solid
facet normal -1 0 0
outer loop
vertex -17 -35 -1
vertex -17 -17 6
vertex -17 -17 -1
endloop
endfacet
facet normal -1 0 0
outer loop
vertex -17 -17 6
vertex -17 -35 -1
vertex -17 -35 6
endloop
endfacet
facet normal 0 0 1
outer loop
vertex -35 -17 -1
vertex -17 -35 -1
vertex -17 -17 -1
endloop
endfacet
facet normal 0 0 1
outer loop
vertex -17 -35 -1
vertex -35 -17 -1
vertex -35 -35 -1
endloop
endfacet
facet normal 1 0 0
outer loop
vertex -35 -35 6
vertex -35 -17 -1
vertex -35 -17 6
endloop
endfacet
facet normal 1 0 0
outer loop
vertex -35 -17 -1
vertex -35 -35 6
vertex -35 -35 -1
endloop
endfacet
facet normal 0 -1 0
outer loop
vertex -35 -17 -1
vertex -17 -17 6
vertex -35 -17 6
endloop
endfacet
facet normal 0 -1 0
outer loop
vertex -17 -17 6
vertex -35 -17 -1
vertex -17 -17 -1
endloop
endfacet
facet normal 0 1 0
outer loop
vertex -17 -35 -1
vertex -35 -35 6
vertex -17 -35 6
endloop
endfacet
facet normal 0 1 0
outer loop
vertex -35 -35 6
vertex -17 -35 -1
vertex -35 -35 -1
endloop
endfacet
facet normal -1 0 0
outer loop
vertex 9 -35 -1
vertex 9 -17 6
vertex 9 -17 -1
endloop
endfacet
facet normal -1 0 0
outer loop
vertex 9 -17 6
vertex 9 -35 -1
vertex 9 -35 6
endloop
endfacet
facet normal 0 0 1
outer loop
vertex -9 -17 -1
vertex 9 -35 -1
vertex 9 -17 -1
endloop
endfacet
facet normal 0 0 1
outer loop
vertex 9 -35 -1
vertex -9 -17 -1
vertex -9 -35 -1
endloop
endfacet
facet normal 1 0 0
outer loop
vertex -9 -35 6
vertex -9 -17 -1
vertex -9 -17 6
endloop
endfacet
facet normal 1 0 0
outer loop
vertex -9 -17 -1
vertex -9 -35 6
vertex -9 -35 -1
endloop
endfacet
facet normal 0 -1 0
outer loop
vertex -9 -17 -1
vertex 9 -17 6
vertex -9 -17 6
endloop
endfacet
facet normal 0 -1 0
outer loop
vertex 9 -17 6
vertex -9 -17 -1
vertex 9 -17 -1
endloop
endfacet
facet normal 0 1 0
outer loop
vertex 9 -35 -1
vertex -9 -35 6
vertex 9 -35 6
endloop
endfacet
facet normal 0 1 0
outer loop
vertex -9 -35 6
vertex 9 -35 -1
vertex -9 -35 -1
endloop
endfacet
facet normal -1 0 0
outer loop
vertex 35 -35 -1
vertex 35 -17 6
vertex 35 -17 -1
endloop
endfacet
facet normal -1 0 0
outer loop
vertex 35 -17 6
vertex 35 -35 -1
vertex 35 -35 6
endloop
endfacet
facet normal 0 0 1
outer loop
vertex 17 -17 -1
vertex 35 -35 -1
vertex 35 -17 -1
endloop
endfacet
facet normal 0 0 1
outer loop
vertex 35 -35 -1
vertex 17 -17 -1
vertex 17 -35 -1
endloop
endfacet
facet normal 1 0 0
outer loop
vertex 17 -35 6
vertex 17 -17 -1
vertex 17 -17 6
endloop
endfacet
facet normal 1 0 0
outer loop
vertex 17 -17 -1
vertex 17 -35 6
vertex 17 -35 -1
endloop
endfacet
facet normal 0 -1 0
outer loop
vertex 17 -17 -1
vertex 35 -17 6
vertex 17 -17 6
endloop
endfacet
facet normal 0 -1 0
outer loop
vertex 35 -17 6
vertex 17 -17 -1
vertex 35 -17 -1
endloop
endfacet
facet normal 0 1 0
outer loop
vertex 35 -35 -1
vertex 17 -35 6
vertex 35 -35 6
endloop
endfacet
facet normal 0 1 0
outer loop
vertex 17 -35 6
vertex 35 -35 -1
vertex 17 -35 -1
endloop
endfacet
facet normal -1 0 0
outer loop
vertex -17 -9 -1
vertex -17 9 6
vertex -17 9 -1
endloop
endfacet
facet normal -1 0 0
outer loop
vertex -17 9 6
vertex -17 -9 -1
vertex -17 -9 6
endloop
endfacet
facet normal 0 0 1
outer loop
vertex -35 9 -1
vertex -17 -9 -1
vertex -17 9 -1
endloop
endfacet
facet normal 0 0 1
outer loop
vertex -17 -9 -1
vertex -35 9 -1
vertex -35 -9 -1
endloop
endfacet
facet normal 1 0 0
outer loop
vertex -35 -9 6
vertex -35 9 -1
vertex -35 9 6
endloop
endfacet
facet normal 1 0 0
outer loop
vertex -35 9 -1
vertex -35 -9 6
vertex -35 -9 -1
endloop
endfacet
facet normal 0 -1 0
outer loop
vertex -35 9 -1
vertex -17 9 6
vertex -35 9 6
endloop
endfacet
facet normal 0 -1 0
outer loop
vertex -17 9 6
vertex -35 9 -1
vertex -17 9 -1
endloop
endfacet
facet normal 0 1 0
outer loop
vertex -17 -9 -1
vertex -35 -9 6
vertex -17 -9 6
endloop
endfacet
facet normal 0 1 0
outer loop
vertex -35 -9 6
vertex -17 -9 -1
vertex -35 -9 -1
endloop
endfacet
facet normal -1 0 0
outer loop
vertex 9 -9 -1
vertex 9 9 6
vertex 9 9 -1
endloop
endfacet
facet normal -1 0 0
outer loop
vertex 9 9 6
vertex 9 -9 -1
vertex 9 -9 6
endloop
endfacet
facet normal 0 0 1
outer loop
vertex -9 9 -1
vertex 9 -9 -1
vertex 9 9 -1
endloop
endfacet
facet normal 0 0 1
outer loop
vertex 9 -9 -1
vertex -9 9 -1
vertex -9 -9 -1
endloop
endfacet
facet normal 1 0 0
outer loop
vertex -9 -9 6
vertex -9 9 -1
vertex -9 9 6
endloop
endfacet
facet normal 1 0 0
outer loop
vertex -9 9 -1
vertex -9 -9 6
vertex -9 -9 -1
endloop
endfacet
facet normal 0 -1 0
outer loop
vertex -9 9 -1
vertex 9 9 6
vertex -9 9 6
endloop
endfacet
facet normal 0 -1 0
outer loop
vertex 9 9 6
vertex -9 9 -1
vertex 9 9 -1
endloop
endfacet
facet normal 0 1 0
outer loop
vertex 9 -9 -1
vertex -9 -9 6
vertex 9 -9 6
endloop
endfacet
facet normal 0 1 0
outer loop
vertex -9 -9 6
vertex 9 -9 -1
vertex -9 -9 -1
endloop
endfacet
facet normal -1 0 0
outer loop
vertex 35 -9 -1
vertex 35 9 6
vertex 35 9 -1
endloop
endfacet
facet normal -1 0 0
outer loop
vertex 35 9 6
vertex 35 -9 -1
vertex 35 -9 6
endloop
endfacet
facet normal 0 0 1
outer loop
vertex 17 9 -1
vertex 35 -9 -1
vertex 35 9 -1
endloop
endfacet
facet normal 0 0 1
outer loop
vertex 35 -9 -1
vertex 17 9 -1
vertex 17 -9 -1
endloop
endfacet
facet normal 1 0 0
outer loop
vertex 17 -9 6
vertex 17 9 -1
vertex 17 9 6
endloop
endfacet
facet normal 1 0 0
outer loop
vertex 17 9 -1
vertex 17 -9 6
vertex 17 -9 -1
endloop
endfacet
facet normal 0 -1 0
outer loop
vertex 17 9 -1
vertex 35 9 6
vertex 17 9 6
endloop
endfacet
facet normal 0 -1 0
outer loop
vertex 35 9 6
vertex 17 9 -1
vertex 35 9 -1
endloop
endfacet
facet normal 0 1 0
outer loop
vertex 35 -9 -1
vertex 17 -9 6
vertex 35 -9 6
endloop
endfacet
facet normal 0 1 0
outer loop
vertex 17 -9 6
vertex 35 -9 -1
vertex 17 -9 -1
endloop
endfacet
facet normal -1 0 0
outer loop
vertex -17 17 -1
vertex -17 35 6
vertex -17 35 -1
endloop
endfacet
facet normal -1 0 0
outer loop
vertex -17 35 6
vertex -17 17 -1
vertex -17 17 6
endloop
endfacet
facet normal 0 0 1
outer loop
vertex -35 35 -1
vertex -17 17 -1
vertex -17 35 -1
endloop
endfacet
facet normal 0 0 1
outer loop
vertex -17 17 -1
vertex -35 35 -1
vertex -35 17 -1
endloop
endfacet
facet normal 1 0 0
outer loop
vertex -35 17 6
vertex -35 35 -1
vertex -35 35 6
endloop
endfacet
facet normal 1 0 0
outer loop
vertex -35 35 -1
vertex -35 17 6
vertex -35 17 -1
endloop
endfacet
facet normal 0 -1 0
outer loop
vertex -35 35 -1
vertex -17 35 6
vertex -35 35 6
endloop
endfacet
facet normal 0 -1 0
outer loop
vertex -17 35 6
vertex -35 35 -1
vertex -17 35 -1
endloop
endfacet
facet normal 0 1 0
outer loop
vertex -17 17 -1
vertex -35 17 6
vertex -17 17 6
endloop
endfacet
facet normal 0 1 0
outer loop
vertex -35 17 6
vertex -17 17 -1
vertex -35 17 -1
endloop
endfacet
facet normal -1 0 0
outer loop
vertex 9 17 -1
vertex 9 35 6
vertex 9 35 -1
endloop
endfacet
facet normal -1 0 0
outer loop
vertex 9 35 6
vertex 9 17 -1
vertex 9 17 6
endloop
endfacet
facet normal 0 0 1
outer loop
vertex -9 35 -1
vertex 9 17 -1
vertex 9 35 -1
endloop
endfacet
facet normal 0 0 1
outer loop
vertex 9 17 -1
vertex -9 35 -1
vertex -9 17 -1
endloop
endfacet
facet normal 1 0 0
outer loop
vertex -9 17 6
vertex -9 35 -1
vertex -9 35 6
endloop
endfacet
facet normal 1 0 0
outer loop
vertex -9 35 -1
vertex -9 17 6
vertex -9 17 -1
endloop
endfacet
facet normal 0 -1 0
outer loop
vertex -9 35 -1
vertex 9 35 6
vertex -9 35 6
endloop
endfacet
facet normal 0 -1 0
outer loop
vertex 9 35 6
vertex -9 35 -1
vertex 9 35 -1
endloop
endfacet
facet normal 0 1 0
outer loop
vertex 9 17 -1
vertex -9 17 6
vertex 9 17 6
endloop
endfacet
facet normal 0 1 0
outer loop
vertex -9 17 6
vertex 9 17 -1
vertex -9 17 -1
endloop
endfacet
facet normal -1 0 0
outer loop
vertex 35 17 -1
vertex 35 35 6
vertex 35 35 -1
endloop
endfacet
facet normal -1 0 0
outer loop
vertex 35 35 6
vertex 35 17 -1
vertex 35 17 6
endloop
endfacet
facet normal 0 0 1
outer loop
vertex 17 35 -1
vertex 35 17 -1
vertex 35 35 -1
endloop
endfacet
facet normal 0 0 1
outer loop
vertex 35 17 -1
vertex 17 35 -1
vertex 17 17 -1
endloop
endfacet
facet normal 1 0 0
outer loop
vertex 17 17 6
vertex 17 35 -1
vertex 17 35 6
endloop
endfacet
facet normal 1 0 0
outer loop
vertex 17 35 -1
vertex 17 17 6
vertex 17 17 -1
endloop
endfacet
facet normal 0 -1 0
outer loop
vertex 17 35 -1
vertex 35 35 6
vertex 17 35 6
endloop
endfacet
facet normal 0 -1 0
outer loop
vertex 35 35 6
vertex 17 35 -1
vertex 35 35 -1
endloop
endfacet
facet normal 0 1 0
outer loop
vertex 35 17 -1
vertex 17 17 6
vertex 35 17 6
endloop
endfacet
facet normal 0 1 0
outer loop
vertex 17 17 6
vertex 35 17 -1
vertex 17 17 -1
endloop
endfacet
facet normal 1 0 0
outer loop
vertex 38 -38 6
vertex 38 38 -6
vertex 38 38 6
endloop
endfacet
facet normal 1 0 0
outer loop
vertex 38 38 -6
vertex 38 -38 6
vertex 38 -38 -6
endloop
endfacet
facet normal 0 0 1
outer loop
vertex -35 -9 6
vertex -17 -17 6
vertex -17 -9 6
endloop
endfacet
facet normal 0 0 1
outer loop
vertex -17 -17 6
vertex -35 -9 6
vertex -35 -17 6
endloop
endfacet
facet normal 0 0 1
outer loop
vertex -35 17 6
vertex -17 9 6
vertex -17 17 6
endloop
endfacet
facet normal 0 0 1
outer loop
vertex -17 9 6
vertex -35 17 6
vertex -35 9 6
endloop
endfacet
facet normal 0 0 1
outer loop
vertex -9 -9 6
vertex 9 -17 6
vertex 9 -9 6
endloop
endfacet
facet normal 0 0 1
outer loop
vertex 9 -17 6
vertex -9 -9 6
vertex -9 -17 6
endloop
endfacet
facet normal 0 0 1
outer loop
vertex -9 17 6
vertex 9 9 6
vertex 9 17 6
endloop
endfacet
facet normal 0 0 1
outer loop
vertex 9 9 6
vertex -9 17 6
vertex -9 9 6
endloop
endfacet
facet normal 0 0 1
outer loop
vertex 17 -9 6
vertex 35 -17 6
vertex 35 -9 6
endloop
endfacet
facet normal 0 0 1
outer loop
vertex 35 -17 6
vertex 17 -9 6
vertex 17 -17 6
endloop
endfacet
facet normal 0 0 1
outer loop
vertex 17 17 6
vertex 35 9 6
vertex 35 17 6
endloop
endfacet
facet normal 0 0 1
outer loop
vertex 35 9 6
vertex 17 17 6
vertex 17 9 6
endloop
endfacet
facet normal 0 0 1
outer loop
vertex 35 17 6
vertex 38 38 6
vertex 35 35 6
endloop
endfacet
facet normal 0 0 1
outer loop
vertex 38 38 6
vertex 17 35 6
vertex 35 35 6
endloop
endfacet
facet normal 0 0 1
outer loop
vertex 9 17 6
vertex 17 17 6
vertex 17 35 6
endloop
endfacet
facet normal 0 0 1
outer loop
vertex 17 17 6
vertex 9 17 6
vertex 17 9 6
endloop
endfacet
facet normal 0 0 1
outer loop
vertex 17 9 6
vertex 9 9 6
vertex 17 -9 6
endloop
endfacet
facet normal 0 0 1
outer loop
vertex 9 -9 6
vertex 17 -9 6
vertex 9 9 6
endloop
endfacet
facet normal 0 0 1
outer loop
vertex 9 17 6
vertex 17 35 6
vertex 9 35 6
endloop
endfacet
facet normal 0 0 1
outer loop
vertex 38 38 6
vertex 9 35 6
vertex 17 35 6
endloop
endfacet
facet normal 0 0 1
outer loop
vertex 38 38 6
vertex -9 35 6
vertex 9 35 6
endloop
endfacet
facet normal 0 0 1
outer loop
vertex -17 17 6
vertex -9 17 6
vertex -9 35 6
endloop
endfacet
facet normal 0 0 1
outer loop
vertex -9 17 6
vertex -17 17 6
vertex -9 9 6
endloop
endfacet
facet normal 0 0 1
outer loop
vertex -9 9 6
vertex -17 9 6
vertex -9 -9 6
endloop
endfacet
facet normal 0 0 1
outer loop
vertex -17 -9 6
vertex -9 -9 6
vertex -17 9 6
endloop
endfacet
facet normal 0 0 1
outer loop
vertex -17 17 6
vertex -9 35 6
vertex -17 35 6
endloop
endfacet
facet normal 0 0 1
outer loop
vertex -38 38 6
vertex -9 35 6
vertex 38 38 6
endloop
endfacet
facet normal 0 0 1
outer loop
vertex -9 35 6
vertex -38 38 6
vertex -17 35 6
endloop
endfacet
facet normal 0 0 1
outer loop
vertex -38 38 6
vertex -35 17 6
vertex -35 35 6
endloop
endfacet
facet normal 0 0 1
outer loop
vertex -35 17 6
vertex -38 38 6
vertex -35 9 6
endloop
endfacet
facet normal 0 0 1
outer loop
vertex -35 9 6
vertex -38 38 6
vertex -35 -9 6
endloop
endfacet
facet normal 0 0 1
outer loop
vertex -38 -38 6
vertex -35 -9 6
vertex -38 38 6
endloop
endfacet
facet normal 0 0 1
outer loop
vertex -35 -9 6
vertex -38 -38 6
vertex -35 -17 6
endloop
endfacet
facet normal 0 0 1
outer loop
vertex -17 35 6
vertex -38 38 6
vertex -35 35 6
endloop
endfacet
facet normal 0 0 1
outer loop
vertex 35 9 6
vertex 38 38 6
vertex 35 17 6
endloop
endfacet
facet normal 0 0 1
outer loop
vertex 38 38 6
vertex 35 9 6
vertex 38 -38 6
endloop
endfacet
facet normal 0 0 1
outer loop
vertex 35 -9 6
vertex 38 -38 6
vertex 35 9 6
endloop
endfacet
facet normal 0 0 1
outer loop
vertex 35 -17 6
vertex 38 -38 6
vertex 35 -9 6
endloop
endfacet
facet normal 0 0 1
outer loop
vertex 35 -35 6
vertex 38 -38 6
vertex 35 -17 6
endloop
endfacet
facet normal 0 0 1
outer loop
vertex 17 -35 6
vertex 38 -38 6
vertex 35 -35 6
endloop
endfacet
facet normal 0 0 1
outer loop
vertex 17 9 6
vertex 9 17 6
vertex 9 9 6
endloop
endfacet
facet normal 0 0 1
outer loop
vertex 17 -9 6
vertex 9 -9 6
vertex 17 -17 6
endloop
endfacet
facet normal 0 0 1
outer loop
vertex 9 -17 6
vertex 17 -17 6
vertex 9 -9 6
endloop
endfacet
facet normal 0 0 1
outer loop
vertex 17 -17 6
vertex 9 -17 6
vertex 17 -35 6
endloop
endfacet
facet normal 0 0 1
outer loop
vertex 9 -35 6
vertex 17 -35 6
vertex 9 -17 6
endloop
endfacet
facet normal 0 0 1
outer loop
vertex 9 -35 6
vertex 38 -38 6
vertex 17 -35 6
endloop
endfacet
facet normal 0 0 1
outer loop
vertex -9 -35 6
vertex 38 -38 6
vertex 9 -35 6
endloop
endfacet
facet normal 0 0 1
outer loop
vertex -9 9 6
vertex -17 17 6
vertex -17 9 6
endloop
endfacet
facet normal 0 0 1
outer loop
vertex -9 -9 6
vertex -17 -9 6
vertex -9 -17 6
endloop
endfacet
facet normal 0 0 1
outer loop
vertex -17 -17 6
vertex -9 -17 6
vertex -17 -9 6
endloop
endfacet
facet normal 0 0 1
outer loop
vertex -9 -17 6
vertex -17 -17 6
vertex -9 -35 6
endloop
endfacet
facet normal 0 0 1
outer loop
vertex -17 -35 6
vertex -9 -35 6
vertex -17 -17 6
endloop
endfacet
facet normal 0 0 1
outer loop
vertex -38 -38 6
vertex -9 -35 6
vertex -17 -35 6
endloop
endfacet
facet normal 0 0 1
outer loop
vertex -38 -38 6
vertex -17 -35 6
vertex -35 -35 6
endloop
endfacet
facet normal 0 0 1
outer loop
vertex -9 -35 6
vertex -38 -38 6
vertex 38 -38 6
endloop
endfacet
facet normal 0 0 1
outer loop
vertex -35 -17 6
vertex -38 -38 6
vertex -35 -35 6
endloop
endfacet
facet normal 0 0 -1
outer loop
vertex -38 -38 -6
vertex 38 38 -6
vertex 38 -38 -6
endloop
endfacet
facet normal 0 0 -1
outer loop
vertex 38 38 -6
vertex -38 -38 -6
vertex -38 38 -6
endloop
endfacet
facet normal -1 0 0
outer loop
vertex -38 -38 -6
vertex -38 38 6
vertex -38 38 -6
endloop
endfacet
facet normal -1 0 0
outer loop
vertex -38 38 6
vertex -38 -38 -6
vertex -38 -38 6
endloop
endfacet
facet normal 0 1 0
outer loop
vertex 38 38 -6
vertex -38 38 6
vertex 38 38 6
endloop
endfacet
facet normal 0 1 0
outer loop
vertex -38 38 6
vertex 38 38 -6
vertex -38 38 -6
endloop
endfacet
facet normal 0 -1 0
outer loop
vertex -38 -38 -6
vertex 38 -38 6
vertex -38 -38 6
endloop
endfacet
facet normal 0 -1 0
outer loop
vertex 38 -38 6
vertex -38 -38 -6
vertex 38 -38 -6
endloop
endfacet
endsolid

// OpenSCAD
$fn = 32;

// ----------------------------------------------------------------------
// Pocket plate 76 x 76 x 12
// 3 x 3 pockets 18 mm square, 7 mm deep
// ----------------------------------------------------------------------

// --- parameters (mm) ---
thickness = 12;  // plate thickness
floor_t = 5;     // material left under each pocket
pocket = 18;     // pocket side length
pitch_x = 26;    // pocket pitch along X
pitch_y = 26;    // pocket pitch along Y
cols = 3;        // pockets per row
rows = 3;        // rows of pockets

// --- derived feature positions (mm) ---
depth = thickness - floor_t;        // = 7   pocket depth, down to the floor
span_x = (cols - 1) * pitch_x;      // = 52   distance between outer pockets
span_y = (rows - 1) * pitch_y;      // = 52   distance between outer pocket rows
origin_x = -span_x / 2;             // = -26   X of the first pocket
origin_y = -span_y / 2;             // = -26   Y of the first pocket
plate = [span_x + pocket + 6, span_y + pocket + 6, thickness];  // = [76, 76, 12]   overall size: pockets plus 3 mm of wall on each side
feature_centers = [
  [origin_x + 0 * pitch_x, origin_y + 0 * pitch_y],
  [origin_x + 1 * pitch_x, origin_y + 0 * pitch_y],
  [origin_x + 2 * pitch_x, origin_y + 0 * pitch_y],
  [origin_x + 0 * pitch_x, origin_y + 1 * pitch_y],
  [origin_x + 1 * pitch_x, origin_y + 1 * pitch_y],
  [origin_x + 2 * pitch_x, origin_y + 1 * pitch_y],
  [origin_x + 0 * pitch_x, origin_y + 2 * pitch_y],
  [origin_x + 1 * pitch_x, origin_y + 2 * pitch_y],
  [origin_x + 2 * pitch_x, origin_y + 2 * pitch_y]
];   // pocket centres, used verbatim by the cutter loop

// plate outline, then one pocket per centre in feature_centers
difference() {
  cube(plate, center = true);
  for (centre = feature_centers)
    translate([centre[0] - pocket / 2, centre[1] - pocket / 2, plate[2] / 2 - depth])
      cube([pocket, pocket, depth + 1]);  // centred on the declared pocket centre
}
